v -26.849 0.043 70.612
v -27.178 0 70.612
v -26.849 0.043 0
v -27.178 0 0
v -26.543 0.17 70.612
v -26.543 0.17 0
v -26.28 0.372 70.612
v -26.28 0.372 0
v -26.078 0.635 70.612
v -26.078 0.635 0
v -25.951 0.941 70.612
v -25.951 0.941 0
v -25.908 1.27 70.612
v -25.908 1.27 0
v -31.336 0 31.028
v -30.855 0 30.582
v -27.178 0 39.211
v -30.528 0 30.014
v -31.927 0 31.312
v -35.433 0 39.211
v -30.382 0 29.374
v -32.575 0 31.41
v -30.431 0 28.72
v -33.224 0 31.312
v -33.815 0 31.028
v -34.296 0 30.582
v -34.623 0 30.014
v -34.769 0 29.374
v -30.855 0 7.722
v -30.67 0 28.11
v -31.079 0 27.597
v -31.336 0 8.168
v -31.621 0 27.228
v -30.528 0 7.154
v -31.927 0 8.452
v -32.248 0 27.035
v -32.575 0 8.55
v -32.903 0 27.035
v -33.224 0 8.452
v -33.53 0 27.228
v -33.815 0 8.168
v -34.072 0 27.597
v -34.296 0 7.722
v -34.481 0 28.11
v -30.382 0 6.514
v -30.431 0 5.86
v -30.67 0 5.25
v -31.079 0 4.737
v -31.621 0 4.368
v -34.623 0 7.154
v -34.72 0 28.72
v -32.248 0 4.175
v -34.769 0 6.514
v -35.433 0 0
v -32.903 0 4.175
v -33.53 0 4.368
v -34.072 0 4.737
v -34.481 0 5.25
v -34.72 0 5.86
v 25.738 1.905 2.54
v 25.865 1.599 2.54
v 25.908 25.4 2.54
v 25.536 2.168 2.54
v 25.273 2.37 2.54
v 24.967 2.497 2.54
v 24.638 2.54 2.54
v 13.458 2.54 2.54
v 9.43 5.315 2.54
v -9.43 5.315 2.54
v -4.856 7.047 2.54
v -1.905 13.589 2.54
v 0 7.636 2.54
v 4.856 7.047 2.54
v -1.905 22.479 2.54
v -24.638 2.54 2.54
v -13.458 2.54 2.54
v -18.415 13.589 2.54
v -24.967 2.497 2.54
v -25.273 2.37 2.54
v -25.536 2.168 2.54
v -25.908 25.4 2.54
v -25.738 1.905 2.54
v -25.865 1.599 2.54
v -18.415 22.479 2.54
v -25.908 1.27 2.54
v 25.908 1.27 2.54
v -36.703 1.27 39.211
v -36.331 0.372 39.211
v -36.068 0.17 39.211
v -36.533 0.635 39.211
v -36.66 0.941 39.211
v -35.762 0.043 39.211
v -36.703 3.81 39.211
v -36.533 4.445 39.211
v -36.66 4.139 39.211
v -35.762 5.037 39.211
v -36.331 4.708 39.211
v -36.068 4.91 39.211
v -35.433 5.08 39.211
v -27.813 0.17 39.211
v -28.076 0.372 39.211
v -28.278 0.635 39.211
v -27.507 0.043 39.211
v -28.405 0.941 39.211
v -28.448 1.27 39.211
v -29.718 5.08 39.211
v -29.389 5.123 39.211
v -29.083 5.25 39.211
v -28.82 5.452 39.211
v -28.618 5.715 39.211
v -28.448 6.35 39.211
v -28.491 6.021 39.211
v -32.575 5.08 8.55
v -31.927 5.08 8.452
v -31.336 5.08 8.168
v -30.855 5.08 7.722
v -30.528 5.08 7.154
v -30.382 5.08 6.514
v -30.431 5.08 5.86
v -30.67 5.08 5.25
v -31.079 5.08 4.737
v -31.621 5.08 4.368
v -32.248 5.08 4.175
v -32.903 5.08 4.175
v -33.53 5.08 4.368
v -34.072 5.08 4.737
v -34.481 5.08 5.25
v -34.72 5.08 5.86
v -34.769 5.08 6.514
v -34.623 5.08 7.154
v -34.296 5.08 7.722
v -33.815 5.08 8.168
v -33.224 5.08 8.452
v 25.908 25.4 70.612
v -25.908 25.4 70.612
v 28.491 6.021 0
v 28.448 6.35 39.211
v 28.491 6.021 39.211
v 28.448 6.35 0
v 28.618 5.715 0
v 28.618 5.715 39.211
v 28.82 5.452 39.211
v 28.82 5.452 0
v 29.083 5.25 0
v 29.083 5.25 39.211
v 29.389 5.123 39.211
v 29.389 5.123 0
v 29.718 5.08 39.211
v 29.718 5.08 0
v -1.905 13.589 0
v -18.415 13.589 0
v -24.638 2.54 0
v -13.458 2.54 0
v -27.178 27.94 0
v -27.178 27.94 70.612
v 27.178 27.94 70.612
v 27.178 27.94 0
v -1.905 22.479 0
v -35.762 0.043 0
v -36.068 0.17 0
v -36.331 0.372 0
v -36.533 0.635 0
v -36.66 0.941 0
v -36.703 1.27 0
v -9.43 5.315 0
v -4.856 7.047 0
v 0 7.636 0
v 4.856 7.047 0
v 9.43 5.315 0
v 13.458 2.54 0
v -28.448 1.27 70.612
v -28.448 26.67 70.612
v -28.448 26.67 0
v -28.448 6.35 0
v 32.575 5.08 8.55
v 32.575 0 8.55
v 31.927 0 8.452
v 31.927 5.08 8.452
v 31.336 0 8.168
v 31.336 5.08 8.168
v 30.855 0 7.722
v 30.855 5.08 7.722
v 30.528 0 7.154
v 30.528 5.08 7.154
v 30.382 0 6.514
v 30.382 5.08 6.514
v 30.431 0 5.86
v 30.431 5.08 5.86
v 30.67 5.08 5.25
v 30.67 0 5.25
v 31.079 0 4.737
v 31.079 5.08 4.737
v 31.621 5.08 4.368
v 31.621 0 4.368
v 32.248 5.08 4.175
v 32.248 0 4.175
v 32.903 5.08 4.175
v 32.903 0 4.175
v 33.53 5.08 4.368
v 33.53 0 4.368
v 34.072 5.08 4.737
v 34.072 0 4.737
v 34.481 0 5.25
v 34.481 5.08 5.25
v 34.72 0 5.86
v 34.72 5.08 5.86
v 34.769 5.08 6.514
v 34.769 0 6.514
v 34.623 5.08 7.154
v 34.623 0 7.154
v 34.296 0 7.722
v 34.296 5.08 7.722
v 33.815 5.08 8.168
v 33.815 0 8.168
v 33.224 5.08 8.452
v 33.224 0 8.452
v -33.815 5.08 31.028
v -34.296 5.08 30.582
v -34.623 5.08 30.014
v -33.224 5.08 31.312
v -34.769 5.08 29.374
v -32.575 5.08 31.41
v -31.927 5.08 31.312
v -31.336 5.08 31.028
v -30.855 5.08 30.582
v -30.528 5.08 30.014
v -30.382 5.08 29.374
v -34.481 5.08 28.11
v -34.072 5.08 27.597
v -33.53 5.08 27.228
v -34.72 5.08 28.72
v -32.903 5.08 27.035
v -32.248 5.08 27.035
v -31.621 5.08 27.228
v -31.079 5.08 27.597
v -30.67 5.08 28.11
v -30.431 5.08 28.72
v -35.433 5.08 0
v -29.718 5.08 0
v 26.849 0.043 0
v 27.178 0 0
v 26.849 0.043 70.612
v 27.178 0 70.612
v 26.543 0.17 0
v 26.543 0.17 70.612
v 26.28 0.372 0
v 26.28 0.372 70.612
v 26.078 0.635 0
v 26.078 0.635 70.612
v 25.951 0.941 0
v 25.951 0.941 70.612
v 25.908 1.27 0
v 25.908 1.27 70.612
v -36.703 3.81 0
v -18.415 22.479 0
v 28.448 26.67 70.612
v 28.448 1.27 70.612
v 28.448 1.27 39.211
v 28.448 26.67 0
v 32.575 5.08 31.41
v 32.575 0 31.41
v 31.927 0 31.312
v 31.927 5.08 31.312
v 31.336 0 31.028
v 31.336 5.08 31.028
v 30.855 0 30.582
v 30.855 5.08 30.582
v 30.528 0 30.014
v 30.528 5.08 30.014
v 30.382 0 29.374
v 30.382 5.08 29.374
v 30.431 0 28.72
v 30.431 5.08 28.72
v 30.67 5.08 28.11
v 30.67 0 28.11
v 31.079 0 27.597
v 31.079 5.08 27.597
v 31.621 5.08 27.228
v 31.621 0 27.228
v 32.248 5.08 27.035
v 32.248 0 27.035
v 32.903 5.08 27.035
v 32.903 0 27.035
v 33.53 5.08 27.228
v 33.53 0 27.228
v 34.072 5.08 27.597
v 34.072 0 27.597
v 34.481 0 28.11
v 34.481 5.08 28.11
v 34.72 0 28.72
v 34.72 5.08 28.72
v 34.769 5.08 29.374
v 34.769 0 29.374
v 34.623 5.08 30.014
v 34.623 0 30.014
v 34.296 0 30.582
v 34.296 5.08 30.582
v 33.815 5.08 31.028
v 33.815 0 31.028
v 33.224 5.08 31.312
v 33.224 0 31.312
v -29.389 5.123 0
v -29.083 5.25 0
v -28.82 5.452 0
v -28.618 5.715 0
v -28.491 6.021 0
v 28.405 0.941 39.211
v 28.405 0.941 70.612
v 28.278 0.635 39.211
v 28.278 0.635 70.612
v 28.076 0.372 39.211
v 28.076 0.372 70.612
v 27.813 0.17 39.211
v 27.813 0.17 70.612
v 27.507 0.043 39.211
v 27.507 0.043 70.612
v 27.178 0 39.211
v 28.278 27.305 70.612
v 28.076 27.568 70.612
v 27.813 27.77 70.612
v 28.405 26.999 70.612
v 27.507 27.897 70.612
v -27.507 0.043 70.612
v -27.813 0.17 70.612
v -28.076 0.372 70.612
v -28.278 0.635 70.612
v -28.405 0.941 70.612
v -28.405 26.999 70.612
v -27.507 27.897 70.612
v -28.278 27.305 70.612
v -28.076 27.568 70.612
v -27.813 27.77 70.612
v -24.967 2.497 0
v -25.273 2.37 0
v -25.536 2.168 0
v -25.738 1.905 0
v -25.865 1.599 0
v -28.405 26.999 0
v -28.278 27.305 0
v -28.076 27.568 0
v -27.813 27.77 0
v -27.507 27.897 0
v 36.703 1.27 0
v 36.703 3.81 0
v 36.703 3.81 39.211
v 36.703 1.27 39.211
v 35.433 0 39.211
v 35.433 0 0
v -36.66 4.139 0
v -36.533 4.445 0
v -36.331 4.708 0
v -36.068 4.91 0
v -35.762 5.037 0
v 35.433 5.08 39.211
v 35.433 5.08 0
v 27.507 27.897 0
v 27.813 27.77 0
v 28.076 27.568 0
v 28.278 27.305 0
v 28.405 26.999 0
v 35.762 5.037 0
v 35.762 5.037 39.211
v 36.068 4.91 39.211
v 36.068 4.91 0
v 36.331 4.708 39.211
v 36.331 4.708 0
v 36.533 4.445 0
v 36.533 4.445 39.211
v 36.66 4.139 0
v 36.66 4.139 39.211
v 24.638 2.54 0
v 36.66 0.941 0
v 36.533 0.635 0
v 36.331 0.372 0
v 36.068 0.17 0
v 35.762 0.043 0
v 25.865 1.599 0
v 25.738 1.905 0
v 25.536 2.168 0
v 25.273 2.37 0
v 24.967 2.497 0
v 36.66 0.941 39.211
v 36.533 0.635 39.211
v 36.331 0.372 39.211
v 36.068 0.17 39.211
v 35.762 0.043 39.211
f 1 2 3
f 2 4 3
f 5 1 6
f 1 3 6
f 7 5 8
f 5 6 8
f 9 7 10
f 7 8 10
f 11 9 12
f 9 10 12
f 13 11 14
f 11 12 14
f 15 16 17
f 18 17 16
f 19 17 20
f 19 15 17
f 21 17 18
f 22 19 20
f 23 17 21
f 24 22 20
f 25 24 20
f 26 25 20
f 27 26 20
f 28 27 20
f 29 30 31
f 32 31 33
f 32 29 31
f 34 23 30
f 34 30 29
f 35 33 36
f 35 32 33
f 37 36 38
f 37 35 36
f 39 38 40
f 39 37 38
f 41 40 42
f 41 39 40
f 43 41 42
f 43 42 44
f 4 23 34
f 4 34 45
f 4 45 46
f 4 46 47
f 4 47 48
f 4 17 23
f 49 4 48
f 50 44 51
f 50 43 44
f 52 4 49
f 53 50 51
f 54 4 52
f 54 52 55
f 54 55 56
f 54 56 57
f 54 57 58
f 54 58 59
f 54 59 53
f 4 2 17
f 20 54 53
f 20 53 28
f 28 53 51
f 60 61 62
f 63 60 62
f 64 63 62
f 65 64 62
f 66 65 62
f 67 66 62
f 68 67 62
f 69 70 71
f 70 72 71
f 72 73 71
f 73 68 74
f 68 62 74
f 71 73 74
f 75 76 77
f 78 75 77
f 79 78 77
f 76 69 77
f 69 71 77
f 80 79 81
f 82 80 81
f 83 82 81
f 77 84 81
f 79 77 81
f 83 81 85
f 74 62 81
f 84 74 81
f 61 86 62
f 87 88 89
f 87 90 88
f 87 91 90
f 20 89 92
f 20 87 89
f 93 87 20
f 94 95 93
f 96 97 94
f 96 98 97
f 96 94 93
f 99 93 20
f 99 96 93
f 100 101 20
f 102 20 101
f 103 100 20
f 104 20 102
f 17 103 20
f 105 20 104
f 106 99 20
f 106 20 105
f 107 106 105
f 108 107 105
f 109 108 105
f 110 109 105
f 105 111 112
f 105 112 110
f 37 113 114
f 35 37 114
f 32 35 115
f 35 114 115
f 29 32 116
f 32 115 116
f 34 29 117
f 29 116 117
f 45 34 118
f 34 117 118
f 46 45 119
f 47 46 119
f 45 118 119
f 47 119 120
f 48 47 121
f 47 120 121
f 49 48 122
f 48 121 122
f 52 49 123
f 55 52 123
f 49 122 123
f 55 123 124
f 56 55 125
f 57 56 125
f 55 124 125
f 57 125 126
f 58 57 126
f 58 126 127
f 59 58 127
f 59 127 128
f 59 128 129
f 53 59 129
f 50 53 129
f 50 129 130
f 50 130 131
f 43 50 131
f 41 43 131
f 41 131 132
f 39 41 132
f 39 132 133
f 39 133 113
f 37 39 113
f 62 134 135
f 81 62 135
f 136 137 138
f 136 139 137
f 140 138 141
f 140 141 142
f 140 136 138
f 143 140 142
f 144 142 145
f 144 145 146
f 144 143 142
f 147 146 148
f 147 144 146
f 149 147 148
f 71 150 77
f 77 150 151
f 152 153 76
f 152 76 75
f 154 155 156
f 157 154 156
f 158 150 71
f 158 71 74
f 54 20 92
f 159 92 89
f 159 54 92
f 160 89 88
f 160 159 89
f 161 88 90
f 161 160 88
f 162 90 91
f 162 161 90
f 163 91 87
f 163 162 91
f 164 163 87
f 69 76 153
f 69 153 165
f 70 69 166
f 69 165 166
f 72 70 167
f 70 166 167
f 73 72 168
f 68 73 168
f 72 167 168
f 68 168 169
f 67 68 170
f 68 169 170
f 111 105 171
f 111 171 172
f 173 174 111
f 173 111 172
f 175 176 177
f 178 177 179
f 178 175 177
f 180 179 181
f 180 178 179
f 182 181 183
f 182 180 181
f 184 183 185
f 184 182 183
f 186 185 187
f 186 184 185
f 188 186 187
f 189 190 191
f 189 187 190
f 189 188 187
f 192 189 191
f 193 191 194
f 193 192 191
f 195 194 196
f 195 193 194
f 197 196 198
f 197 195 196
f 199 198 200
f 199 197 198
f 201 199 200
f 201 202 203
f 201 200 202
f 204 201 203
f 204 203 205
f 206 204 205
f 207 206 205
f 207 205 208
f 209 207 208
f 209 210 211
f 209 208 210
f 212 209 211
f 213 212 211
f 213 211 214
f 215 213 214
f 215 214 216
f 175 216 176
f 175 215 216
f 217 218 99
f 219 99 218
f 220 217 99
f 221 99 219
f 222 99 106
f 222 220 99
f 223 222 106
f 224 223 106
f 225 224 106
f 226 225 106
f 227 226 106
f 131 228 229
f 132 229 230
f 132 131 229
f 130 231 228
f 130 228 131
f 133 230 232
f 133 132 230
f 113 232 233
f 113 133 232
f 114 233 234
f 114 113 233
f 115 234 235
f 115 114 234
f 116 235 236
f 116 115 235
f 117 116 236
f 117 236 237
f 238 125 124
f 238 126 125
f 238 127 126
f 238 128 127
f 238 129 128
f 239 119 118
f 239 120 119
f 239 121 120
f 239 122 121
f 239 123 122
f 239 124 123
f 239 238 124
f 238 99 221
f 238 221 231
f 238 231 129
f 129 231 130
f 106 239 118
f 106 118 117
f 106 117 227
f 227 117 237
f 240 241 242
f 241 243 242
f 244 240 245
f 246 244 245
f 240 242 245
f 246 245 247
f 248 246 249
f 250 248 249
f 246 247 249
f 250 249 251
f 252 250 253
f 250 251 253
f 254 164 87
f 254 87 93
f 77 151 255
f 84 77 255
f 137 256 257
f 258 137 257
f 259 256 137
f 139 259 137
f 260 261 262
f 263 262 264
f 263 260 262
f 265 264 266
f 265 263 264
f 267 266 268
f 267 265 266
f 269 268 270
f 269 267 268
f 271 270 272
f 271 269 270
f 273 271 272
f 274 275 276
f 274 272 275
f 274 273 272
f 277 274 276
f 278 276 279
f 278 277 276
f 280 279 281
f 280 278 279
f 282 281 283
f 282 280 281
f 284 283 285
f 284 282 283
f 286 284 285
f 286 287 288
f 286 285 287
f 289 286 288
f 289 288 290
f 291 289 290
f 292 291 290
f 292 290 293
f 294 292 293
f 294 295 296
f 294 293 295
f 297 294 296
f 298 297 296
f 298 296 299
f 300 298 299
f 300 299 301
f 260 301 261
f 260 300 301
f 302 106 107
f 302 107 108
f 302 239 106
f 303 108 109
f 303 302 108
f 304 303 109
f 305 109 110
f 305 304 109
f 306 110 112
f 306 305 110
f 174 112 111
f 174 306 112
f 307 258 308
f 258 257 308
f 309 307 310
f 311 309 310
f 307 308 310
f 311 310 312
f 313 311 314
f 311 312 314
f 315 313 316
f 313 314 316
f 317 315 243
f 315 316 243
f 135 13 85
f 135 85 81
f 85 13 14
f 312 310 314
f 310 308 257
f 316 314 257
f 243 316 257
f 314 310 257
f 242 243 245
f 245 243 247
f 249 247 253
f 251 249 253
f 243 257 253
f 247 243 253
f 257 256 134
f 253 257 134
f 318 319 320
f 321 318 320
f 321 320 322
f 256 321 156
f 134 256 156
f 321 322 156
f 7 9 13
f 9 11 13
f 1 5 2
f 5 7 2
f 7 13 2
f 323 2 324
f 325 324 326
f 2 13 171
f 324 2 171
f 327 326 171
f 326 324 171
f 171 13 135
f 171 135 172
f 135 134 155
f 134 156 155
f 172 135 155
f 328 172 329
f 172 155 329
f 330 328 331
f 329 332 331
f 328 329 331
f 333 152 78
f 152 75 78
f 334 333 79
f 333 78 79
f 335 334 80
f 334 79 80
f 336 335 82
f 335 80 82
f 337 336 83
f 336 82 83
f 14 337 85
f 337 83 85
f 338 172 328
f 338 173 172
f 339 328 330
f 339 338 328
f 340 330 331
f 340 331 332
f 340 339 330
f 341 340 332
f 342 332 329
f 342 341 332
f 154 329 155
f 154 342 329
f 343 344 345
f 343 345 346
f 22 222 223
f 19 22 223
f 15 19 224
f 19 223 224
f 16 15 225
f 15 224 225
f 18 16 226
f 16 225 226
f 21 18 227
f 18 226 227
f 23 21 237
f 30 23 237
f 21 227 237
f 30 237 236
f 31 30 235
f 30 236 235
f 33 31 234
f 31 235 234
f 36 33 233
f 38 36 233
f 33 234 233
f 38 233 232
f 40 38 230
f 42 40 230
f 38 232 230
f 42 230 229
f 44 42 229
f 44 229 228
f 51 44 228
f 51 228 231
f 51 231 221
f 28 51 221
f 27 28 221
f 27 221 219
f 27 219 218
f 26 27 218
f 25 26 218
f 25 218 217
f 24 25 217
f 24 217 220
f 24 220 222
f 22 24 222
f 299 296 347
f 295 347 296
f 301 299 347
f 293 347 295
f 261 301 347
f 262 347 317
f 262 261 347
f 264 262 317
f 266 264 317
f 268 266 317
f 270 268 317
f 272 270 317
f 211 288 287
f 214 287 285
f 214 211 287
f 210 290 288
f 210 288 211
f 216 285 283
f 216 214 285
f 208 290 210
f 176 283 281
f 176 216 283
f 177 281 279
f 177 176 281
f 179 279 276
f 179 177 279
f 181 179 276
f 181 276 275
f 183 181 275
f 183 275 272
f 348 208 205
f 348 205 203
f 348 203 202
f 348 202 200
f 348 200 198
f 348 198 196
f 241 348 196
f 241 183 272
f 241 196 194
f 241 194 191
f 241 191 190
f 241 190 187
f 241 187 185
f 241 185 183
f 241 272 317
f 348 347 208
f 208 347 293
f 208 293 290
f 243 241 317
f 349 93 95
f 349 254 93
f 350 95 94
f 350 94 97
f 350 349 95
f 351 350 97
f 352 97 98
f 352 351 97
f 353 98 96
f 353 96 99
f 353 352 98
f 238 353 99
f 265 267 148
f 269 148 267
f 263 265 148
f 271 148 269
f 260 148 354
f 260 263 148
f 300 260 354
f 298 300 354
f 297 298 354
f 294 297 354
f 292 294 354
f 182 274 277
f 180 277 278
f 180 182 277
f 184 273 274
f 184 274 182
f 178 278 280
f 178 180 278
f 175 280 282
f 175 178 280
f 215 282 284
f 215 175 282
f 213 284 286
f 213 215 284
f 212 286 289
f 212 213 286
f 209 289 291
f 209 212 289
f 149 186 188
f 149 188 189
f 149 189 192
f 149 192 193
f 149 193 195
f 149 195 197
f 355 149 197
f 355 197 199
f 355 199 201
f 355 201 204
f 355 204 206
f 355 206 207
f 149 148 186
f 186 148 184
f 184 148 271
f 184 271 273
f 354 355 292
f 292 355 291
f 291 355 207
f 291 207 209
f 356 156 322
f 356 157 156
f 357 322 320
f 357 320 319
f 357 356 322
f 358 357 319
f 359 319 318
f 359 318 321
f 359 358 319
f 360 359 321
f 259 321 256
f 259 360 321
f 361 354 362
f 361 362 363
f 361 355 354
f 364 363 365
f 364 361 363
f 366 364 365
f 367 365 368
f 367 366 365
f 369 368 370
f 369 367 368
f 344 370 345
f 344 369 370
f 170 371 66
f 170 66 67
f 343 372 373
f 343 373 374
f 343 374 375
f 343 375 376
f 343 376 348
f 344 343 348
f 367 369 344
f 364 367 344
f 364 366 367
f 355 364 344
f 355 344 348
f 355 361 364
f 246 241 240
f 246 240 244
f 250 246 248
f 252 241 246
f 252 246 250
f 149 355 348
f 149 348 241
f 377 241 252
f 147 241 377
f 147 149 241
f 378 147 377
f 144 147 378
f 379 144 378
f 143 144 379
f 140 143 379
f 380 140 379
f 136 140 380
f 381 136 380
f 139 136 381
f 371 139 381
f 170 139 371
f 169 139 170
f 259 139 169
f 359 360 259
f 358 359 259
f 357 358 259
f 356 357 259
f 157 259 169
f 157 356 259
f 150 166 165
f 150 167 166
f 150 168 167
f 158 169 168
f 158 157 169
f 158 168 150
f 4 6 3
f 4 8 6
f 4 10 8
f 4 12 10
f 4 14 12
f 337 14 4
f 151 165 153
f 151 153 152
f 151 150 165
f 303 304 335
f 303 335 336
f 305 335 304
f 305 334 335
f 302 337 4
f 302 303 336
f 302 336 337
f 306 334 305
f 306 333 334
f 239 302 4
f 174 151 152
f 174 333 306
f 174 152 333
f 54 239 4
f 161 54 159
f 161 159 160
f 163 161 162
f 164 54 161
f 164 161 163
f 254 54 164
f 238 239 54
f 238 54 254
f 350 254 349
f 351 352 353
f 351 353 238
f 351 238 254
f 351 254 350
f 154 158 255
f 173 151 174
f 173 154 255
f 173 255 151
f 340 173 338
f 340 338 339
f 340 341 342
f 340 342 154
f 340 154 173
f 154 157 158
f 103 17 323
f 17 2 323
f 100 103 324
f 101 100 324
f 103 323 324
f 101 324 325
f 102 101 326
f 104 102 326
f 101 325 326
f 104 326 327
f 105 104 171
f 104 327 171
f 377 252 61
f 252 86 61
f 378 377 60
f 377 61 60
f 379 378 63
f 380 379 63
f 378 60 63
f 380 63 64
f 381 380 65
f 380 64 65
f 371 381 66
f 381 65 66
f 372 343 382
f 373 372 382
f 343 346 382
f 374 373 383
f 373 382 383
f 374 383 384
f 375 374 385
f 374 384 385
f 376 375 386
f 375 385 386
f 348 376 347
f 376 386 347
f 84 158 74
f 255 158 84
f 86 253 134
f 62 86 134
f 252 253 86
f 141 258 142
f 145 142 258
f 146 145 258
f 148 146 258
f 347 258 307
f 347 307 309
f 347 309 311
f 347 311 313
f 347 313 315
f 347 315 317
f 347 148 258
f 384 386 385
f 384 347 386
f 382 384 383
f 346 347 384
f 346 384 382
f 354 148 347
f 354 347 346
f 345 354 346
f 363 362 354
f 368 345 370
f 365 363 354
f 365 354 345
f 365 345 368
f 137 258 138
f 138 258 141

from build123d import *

# Parameters (mm, degrees)
BOSS_EXTRUDE1_DEPTH = 70.612
SKETCH2_R           = 2.2
CUT_EXTRUDE1_DEPTH  = 83.799422419
SKETCH3_W           = 8.255
SKETCH3_H           = 31.401404102
CUT_EXTRUDE2_DEPTH  = 83.799422419
BOSS_EXTRUDE3_DEPTH = 2.54
CUT_EXTRUDE6_DEPTH  = 2.54
SKETCH9_W           = 51.816
SKETCH9_H           = 2.54
CUT_EXTRUDE7_DEPTH  = 2.54
FILLET1_R           = 1.27
FILLET2_R           = 1.27
SKETCH11_W          = 16.51
SKETCH11_H          = 8.89
CUT_EXTRUDE8_DEPTH  = 2.54


with BuildPart() as part:
    # Sketch1 → Boss-Extrude1 (new body)
    with BuildSketch(Plane.XY):
        Polygon((25.908, 25.4), (-25.908, 25.4), (-25.908, 0), (-36.703, 0), (-36.703, 5.08), (-28.448, 5.08), (-28.448, 27.94), (28.448, 27.94), (28.448, 5.08), (36.703, 5.08), (36.703, 0), (25.908, 0), align=None)
    extrude(amount=BOSS_EXTRUDE1_DEPTH)

    # Sketch2 → Cut-Extrude1 (cut, through all)
    with BuildSketch(Plane(origin=(0, 5.08, 0), x_dir=(1, 0, 0), z_dir=(0, 1, 0))):
        with Locations(Location((-32.5755, -6.35, 0), (0, 0, 270))):
            Circle(SKETCH2_R)
        with Locations(Location((-32.5755, -29.21, 0), (0, 0, 270))):
            Circle(SKETCH2_R)
    cut_extrude1 = extrude(amount=-CUT_EXTRUDE1_DEPTH, mode=Mode.SUBTRACT)

    # Mirror1: Cut-Extrude1 across plane
    add(cut_extrude1.mirror(Plane(origin=(0, 0, 0), x_dir=(0, 0, 1), z_dir=(1, 0, 0))), mode=Mode.SUBTRACT)

    # Sketch3 → Cut-Extrude2 (cut, through all)
    with BuildSketch(Plane(origin=(0, 5.08, 0), x_dir=(1, 0, 0), z_dir=(0, 1, 0))):
        with Locations((-32.5755, -54.911297949)):
            Rectangle(SKETCH3_W, SKETCH3_H)
        with Locations((32.5755, -54.911297949)):
            Rectangle(SKETCH3_W, SKETCH3_H)
    extrude(amount=-CUT_EXTRUDE2_DEPTH, mode=Mode.SUBTRACT)

    # Sketch6 → Boss-Extrude3 (add)
    with BuildSketch(Plane(origin=(0, 0, 0), x_dir=(-1, 0, 0), z_dir=(0, 0, -1))):
        Polygon((-25.908, 0), (25.908, 0), (36.703, 0), (36.703, 5.08), (28.448, 5.08), (28.448, 27.94), (-28.448, 27.94), (-28.448, 5.08), (-36.703, 5.08), (-36.703, 0), align=None)
    extrude(amount=-BOSS_EXTRUDE3_DEPTH)

    # Sketch8 → Cut-Extrude6 (cut)
    with BuildSketch(Plane(origin=(0, 0, 0), x_dir=(-1, 0, 0), z_dir=(0, 0, -1))):
        with BuildLine():
            Line((-15.875, 0), (15.875, 0))
            ThreePointArc((15.875, 0), (0, 7.635884934), (-15.875, 0))
        make_face()
    extrude(amount=-CUT_EXTRUDE6_DEPTH, mode=Mode.SUBTRACT)

    # Sketch9 → Cut-Extrude7 (cut)
    with BuildSketch(Plane(origin=(0, 0, 0), x_dir=(-1, 0, 0), z_dir=(0, 0, -1))):
        with Locations((0, 1.27)):
            Rectangle(SKETCH9_W, SKETCH9_H)
    extrude(amount=-CUT_EXTRUDE7_DEPTH, mode=Mode.SUBTRACT)

    # Fillet1
    fillet1_edges = [part.edges().sort_by_distance(p)[0] for p in [
        (-25.908, 0, 35.306),
        (-28.448, 27.94, 35.306),
        (28.448, 27.94, 35.306),
        (25.908, 0, 35.306),
        (-36.703, 0, 19.605297949),
        (-36.703, 5.08, 19.605297949),
        (-28.448, 5.08, 19.605297949),
        (28.448, 5.08, 19.605297949),
        (36.703, 5.08, 19.605297949),
        (36.703, 0, 19.605297949),
        (-28.448, 0, 54.911297949),
        (28.448, 0, 54.911297949),
    ]]
    fillet(fillet1_edges, radius=FILLET1_R - 0.0001)  # a hair under: the kernel refuses the full size

    # Fillet2
    fillet2_edges = [part.edges().sort_by_distance(p)[0] for p in [
        (-25.908, 2.54, 1.27),
        (25.908, 2.54, 1.27),
    ]]
    fillet(fillet2_edges, radius=FILLET2_R)

    # Sketch11 → Cut-Extrude8 (cut)
    with BuildSketch(Plane(origin=(0, 0, 0), x_dir=(-1, 0, 0), z_dir=(0, 0, -1))):
        with Locations((10.16, 18.034)):
            Rectangle(SKETCH11_W, SKETCH11_H)
    extrude(amount=-CUT_EXTRUDE8_DEPTH, mode=Mode.SUBTRACT)


solid = part.part
